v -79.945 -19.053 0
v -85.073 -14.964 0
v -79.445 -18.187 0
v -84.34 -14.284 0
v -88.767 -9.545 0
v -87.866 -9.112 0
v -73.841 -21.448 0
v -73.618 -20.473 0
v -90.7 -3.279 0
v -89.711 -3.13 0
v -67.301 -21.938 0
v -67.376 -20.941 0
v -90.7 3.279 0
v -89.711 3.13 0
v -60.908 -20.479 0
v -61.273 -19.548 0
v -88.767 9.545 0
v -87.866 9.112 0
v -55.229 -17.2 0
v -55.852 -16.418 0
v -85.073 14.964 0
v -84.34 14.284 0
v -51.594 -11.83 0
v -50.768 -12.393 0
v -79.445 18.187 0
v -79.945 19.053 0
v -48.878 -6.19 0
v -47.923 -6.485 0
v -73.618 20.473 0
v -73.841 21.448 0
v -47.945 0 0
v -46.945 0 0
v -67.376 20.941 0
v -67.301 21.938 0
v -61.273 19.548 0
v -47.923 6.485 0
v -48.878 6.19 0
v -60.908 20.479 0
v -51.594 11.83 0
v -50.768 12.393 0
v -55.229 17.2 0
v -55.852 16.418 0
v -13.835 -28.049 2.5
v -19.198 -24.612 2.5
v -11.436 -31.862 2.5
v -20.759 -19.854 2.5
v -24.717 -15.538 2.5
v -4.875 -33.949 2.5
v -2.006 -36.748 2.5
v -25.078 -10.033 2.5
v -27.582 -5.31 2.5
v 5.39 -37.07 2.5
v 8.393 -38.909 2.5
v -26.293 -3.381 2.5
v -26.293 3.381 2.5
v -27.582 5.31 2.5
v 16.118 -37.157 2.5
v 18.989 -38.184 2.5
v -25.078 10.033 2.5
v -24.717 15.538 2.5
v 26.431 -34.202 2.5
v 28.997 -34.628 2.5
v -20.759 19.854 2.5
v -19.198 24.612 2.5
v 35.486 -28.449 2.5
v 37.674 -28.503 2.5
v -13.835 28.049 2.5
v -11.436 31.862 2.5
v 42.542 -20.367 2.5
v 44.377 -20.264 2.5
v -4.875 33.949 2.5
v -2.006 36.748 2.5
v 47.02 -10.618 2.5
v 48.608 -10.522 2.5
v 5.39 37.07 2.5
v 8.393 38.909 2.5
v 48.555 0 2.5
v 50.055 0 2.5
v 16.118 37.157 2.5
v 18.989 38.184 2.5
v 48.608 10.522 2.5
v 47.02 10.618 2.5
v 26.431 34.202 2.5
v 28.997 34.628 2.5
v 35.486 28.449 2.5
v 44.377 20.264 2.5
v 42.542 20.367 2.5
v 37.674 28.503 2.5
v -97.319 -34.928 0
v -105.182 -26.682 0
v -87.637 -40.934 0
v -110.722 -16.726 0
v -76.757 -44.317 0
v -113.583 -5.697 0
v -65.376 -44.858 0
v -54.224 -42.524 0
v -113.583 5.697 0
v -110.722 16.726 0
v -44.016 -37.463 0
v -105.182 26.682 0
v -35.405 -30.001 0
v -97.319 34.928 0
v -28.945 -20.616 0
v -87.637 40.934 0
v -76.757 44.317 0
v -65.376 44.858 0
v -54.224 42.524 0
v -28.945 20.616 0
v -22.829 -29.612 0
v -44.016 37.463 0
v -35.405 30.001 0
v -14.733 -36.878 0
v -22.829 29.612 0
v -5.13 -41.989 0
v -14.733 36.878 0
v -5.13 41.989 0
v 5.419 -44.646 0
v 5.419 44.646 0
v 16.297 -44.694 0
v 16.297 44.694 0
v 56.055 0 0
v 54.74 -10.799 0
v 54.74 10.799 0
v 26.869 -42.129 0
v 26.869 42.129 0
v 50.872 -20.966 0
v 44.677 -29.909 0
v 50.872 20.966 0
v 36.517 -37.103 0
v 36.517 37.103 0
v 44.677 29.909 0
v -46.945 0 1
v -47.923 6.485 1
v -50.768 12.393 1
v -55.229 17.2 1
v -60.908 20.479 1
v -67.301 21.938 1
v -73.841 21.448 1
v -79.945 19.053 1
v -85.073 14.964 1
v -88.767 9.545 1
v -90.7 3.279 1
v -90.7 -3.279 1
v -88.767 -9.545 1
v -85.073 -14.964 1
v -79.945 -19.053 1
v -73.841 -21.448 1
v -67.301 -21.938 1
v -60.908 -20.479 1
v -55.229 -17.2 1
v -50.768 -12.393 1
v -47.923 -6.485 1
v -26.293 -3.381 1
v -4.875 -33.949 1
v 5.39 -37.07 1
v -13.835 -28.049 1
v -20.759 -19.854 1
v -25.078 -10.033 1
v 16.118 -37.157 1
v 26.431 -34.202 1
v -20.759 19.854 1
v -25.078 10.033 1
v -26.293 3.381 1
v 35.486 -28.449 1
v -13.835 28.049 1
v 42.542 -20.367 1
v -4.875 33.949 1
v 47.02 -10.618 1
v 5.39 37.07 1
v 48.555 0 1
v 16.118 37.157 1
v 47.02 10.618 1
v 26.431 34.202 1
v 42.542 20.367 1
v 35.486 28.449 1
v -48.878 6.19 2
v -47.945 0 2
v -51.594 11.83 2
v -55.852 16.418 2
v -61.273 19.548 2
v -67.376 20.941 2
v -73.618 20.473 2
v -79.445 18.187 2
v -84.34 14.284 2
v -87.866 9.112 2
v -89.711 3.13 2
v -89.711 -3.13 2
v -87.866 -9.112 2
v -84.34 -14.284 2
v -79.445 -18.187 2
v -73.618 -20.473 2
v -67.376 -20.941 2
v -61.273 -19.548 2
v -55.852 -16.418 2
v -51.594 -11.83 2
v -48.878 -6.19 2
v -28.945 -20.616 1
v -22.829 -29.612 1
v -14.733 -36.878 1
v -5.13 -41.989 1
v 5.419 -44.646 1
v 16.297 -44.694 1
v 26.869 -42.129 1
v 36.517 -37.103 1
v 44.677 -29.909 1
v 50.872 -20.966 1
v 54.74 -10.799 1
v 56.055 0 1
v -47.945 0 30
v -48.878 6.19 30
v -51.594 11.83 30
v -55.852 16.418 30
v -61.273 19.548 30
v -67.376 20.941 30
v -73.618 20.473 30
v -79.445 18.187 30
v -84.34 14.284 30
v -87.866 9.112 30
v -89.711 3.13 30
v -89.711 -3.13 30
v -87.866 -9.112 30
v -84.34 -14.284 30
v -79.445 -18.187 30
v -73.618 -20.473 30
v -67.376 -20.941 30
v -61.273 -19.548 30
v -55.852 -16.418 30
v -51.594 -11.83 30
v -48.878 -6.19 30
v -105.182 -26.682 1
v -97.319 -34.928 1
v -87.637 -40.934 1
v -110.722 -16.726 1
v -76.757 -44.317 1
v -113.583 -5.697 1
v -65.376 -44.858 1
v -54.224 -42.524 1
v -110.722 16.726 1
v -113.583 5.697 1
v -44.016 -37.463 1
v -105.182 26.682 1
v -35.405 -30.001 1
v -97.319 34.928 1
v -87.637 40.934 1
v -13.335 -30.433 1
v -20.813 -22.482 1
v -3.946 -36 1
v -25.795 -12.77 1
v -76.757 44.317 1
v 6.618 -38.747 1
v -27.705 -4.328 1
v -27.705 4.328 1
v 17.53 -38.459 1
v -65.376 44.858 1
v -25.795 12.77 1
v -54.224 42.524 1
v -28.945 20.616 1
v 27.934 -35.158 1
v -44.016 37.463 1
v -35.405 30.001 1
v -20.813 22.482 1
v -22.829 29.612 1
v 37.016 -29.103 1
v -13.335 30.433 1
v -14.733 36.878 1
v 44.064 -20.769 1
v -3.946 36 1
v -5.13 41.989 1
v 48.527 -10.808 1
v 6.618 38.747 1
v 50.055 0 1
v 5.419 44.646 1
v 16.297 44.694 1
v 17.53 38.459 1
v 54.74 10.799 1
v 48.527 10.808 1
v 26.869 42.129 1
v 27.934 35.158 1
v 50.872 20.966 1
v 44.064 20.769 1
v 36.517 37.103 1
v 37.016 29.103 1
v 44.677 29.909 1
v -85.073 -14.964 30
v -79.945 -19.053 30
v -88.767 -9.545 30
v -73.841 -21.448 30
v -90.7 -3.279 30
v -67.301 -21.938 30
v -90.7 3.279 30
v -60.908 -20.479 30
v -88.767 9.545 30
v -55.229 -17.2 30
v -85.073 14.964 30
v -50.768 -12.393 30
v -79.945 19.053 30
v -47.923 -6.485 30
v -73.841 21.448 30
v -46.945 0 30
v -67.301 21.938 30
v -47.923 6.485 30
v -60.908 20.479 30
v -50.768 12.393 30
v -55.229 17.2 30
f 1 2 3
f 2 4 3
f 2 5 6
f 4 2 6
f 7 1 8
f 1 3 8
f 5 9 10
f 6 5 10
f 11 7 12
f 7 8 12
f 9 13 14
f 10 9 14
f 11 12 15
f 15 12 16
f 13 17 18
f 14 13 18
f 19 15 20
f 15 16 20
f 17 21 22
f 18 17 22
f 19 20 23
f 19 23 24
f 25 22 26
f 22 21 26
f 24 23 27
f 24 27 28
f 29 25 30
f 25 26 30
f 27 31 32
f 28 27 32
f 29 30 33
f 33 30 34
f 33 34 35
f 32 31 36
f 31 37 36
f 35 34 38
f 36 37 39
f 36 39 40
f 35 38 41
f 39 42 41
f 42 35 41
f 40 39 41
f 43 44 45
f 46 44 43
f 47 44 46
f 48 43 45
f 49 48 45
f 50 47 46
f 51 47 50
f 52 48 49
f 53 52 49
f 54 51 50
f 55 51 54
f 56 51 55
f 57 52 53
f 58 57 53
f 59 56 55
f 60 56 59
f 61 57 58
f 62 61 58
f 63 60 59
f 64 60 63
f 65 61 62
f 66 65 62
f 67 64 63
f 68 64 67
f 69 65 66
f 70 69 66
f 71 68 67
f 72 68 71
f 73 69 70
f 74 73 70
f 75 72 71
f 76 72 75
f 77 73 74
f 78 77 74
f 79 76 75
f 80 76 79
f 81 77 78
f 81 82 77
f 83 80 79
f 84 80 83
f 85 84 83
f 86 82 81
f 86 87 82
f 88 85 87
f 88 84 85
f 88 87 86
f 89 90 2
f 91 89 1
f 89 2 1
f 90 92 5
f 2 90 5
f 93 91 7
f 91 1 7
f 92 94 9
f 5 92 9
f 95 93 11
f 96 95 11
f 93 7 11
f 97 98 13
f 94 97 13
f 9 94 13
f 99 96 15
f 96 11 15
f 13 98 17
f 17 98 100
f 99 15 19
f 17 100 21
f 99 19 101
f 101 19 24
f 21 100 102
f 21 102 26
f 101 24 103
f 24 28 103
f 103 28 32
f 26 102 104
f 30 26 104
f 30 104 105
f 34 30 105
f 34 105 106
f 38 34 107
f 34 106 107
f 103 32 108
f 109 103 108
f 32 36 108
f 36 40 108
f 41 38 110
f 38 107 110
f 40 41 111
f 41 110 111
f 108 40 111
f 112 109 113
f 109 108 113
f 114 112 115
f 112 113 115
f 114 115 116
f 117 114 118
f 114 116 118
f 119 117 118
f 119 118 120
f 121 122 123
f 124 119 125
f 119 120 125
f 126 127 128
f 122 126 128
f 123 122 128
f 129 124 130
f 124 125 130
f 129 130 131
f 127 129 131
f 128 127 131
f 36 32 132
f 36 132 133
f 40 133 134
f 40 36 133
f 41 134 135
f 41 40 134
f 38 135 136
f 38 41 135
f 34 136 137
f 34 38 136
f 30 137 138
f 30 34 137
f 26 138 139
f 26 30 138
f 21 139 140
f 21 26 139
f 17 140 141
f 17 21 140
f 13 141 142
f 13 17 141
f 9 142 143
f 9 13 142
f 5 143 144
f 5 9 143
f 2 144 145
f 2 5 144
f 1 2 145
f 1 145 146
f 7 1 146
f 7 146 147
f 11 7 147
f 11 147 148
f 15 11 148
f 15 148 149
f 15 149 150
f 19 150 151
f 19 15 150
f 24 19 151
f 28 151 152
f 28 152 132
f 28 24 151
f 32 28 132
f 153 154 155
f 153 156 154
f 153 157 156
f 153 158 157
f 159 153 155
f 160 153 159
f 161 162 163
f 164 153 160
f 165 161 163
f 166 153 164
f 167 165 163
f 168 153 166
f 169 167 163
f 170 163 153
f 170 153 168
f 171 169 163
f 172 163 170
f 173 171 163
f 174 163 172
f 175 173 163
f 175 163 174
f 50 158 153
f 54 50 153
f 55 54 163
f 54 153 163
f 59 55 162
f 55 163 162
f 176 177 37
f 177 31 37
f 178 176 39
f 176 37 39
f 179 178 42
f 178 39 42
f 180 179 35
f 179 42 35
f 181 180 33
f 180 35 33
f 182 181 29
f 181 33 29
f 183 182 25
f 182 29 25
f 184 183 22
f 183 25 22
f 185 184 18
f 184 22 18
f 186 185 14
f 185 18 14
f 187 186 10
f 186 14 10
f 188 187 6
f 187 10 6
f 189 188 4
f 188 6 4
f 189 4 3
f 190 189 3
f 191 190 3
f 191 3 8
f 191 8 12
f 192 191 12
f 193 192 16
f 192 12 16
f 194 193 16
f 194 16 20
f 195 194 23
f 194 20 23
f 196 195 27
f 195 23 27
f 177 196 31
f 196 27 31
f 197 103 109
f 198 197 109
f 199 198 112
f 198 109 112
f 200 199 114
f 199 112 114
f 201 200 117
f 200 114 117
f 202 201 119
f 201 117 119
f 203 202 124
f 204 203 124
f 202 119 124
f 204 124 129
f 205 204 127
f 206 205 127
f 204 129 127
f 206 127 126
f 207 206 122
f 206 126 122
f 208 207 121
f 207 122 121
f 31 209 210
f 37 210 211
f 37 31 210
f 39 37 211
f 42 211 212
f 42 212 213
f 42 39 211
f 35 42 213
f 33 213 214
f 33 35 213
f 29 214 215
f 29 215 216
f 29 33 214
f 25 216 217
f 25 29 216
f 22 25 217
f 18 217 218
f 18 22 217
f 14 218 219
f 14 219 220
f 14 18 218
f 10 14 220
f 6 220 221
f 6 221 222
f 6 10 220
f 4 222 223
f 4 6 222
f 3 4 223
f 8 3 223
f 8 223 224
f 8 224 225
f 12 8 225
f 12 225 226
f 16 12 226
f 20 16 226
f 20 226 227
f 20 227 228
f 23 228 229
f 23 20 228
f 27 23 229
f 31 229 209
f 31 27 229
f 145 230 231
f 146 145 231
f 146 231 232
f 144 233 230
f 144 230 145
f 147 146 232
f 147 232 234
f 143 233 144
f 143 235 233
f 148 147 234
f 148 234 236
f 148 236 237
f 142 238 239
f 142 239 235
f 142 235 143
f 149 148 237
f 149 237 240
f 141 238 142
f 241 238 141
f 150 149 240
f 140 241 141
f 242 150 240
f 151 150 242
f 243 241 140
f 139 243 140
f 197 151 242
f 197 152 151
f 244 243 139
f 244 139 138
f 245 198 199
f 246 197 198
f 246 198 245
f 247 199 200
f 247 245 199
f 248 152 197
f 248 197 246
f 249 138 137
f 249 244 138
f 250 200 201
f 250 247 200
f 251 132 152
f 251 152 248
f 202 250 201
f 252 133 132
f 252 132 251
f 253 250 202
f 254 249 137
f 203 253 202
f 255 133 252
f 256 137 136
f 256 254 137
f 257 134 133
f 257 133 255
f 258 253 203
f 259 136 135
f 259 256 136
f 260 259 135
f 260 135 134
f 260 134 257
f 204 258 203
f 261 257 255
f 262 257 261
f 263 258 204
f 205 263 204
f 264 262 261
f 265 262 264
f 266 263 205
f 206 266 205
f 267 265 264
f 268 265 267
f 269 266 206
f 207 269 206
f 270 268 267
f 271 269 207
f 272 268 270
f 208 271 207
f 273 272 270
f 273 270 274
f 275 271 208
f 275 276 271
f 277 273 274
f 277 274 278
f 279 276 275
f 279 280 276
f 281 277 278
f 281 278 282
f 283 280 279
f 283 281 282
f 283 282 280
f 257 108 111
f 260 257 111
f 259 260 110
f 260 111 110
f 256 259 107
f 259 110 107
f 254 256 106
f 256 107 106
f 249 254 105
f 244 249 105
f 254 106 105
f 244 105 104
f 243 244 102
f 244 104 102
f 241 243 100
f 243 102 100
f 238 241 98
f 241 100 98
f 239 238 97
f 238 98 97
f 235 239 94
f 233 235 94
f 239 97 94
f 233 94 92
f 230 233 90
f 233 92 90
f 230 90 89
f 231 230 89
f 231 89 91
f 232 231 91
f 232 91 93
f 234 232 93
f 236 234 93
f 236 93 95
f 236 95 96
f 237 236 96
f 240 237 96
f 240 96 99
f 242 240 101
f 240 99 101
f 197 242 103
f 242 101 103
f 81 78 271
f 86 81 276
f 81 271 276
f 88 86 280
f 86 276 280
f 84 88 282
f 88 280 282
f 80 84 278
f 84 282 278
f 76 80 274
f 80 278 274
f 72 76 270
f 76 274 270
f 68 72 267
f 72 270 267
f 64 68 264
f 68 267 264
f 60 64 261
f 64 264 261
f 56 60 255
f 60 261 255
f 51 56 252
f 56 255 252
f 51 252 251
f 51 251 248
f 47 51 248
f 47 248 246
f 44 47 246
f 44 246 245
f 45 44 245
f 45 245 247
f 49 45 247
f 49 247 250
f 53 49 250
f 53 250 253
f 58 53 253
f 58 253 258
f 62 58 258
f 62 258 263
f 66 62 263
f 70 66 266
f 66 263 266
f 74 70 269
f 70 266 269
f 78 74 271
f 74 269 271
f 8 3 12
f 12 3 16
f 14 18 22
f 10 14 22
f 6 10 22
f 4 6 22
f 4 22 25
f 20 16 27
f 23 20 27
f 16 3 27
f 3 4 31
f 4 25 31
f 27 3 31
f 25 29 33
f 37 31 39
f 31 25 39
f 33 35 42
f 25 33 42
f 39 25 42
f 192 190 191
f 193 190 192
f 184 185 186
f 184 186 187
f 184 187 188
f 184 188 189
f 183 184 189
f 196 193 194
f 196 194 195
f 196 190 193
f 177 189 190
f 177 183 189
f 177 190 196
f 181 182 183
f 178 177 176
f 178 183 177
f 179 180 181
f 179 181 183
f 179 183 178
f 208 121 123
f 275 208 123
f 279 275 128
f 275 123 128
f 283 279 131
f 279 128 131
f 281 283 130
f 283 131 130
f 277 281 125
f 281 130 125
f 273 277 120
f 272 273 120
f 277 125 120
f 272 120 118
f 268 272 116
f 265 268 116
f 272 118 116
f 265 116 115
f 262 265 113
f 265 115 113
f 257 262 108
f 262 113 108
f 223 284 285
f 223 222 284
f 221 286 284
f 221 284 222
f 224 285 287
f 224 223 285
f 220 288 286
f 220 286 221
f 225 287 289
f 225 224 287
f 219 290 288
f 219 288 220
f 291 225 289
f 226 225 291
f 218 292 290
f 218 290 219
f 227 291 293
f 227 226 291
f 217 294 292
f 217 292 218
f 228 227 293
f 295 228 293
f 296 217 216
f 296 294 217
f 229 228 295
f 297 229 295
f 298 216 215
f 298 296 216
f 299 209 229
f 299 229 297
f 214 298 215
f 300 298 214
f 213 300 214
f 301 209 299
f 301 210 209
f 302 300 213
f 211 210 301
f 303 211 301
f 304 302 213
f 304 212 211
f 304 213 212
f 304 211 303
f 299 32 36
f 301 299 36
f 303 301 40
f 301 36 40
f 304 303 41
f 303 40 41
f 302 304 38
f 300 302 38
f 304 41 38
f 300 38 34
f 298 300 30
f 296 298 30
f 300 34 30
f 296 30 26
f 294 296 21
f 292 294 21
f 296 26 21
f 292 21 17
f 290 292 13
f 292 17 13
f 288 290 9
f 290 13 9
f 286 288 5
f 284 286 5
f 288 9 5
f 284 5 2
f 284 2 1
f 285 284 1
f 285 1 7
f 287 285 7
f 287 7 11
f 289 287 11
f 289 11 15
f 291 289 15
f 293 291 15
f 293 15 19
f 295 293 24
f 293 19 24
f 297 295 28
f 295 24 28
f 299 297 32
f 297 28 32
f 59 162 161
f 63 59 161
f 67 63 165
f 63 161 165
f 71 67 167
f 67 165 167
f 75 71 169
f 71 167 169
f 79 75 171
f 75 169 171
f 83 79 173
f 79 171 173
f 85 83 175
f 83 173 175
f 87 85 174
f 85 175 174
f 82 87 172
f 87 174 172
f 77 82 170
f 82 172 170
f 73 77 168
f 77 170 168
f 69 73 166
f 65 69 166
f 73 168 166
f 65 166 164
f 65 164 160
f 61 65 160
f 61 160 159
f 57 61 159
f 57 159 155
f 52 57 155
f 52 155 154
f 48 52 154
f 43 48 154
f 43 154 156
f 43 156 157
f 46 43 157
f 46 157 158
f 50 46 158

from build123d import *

# Parameters (mm, degrees)
F0_R     = 22
F1_DEPTH = 1
F0_R_2   = 21
F2_DEPTH = 1
F3_DEPTH = 30
F4_DEPTH = 1
F5_DEPTH = 2.5


with BuildPart() as f1:
    # F0 (on Top) → F1 (new body)
    with BuildSketch(Plane.XY):
        with BuildLine():
            ThreePointArc((-28.94545121, 20.6155281281), (-27.1858056608, 16.7669914896), (-25.79545121, 12.7701801084))
            ThreePointArc((-25.79545121, 12.7701801084), (17.5295005273, 38.4587441293), (50.05454879, 0))
            ThreePointArc((50.05454879, 0), (17.5295005273, -38.4587441293), (-25.79545121, -12.7701801084))
            ThreePointArc((-25.79545121, -12.7701801084), (-27.1858056608, -16.7669914896), (-28.94545121, -20.6155281281))
            ThreePointArc((-28.94545121, -20.6155281281), (21.6611505078, -43.7321392113), (56.05454879, 0))
            ThreePointArc((56.05454879, 0), (21.6611505078, 43.7321392113), (-28.94545121, 20.6155281281))
        make_face()
        with BuildLine():
            ThreePointArc((-25.07826371, 10.0334371399), (-24.2295511435, 5.0485920067), (-23.94545121, 0))
            ThreePointArc((-23.94545121, 0), (-24.2295511435, -5.0485920067), (-25.07826371, -10.0334371399))
            ThreePointArc((-25.07826371, -10.0334371399), (16.1176274607, -37.1566310956), (48.55454879, 0))
            ThreePointArc((48.55454879, 0), (16.1176274607, 37.1566310956), (-25.07826371, 10.0334371399))
        make_face()
        with BuildLine():
            ThreePointArc((-28.94545121, -20.6155281281), (-33.94545121, 0), (-28.94545121, 20.6155281281))
            ThreePointArc((-28.94545121, 20.6155281281), (-113.94545121, 0), (-28.94545121, -20.6155281281))
        make_face()
        with Locations((-68.94545121, 0)):
            Circle(F0_R, mode=Mode.SUBTRACT)
        with BuildLine():
            ThreePointArc((-25.79545121, -12.7701801084), (-27.94545121, 0), (-25.79545121, 12.7701801084))
            ThreePointArc((-25.79545121, 12.7701801084), (-27.1858056608, 16.7669914896), (-28.94545121, 20.6155281281))
            ThreePointArc((-28.94545121, 20.6155281281), (-33.94545121, 0), (-28.94545121, -20.6155281281))
            ThreePointArc((-28.94545121, -20.6155281281), (-27.1858056608, -16.7669914896), (-25.79545121, -12.7701801084))
        make_face()
        with BuildLine():
            ThreePointArc((-25.79545121, 12.7701801084), (-25.4153447247, 11.4074462251), (-25.07826371, 10.0334371399))
            ThreePointArc((-25.07826371, 10.0334371399), (16.1176274607, 37.1566310956), (48.55454879, 0))
            ThreePointArc((48.55454879, 0), (16.1176274607, -37.1566310956), (-25.07826371, -10.0334371399))
            ThreePointArc((-25.07826371, -10.0334371399), (-25.4153447247, -11.4074462251), (-25.79545121, -12.7701801084))
            ThreePointArc((-25.79545121, -12.7701801084), (17.5295005273, -38.4587441293), (50.05454879, 0))
            ThreePointArc((50.05454879, 0), (17.5295005273, 38.4587441293), (-25.79545121, 12.7701801084))
        make_face()
    extrude(amount=F1_DEPTH)

    # F0 (on Top) → F4 (join)
    with BuildSketch(Plane.XY):
        with BuildLine():
            ThreePointArc((-25.07826371, -10.0334371399), (-24.2295511435, -5.0485920067), (-23.94545121, 0))
            ThreePointArc((-23.94545121, 0), (-24.2295511435, 5.0485920067), (-25.07826371, 10.0334371399))
            ThreePointArc((-25.07826371, 10.0334371399), (-26.44545121, 0), (-25.07826371, -10.0334371399))
        make_face()
    extrude(amount=F4_DEPTH)

    # F0 (on Top) → F5 (join)
    with BuildSketch(Plane.XY):
        with BuildLine():
            ThreePointArc((-25.79545121, 12.7701801084), (-25.4153447247, 11.4074462251), (-25.07826371, 10.0334371399))
            ThreePointArc((-25.07826371, 10.0334371399), (16.1176274607, 37.1566310956), (48.55454879, 0))
            ThreePointArc((48.55454879, 0), (16.1176274607, -37.1566310956), (-25.07826371, -10.0334371399))
            ThreePointArc((-25.07826371, -10.0334371399), (-25.4153447247, -11.4074462251), (-25.79545121, -12.7701801084))
            ThreePointArc((-25.79545121, -12.7701801084), (17.5295005273, -38.4587441293), (50.05454879, 0))
            ThreePointArc((50.05454879, 0), (17.5295005273, 38.4587441293), (-25.79545121, 12.7701801084))
        make_face()
        with BuildLine():
            ThreePointArc((-25.07826371, -10.0334371399), (-26.44545121, 0), (-25.07826371, 10.0334371399))
            ThreePointArc((-25.07826371, 10.0334371399), (-25.4153447247, 11.4074462251), (-25.79545121, 12.7701801084))
            ThreePointArc((-25.79545121, 12.7701801084), (-27.94545121, 0), (-25.79545121, -12.7701801084))
            ThreePointArc((-25.79545121, -12.7701801084), (-25.4153447247, -11.4074462251), (-25.07826371, -10.0334371399))
        make_face()
    extrude(amount=F5_DEPTH)


with BuildPart() as f1b:
    # F0 (on Top) → F1, piece 2 (new body)
    with BuildSketch(Plane.XY):
        with Locations((-68.94545121, 0)):
            Circle(F0_R_2)
    extrude(amount=F1_DEPTH)

    # F2 (add): a face of the model
    f2_faces = [f1b.faces().sort_by_distance(p)[0] for p in [
        (-68.94545121, 0, 1),
    ]]
    extrude(f2_faces, amount=F2_DEPTH)


with BuildPart() as f3:
    # F0 (on Top) → F3 (new body)
    with BuildSketch(Plane.XY):
        with Locations((-68.94545121, 0)):
            Circle(F0_R)
        with Locations((-68.94545121, 0)):
            Circle(F0_R_2, mode=Mode.SUBTRACT)
    extrude(amount=F3_DEPTH)


solid = Compound([f1.part, f1b.part, f3.part])
